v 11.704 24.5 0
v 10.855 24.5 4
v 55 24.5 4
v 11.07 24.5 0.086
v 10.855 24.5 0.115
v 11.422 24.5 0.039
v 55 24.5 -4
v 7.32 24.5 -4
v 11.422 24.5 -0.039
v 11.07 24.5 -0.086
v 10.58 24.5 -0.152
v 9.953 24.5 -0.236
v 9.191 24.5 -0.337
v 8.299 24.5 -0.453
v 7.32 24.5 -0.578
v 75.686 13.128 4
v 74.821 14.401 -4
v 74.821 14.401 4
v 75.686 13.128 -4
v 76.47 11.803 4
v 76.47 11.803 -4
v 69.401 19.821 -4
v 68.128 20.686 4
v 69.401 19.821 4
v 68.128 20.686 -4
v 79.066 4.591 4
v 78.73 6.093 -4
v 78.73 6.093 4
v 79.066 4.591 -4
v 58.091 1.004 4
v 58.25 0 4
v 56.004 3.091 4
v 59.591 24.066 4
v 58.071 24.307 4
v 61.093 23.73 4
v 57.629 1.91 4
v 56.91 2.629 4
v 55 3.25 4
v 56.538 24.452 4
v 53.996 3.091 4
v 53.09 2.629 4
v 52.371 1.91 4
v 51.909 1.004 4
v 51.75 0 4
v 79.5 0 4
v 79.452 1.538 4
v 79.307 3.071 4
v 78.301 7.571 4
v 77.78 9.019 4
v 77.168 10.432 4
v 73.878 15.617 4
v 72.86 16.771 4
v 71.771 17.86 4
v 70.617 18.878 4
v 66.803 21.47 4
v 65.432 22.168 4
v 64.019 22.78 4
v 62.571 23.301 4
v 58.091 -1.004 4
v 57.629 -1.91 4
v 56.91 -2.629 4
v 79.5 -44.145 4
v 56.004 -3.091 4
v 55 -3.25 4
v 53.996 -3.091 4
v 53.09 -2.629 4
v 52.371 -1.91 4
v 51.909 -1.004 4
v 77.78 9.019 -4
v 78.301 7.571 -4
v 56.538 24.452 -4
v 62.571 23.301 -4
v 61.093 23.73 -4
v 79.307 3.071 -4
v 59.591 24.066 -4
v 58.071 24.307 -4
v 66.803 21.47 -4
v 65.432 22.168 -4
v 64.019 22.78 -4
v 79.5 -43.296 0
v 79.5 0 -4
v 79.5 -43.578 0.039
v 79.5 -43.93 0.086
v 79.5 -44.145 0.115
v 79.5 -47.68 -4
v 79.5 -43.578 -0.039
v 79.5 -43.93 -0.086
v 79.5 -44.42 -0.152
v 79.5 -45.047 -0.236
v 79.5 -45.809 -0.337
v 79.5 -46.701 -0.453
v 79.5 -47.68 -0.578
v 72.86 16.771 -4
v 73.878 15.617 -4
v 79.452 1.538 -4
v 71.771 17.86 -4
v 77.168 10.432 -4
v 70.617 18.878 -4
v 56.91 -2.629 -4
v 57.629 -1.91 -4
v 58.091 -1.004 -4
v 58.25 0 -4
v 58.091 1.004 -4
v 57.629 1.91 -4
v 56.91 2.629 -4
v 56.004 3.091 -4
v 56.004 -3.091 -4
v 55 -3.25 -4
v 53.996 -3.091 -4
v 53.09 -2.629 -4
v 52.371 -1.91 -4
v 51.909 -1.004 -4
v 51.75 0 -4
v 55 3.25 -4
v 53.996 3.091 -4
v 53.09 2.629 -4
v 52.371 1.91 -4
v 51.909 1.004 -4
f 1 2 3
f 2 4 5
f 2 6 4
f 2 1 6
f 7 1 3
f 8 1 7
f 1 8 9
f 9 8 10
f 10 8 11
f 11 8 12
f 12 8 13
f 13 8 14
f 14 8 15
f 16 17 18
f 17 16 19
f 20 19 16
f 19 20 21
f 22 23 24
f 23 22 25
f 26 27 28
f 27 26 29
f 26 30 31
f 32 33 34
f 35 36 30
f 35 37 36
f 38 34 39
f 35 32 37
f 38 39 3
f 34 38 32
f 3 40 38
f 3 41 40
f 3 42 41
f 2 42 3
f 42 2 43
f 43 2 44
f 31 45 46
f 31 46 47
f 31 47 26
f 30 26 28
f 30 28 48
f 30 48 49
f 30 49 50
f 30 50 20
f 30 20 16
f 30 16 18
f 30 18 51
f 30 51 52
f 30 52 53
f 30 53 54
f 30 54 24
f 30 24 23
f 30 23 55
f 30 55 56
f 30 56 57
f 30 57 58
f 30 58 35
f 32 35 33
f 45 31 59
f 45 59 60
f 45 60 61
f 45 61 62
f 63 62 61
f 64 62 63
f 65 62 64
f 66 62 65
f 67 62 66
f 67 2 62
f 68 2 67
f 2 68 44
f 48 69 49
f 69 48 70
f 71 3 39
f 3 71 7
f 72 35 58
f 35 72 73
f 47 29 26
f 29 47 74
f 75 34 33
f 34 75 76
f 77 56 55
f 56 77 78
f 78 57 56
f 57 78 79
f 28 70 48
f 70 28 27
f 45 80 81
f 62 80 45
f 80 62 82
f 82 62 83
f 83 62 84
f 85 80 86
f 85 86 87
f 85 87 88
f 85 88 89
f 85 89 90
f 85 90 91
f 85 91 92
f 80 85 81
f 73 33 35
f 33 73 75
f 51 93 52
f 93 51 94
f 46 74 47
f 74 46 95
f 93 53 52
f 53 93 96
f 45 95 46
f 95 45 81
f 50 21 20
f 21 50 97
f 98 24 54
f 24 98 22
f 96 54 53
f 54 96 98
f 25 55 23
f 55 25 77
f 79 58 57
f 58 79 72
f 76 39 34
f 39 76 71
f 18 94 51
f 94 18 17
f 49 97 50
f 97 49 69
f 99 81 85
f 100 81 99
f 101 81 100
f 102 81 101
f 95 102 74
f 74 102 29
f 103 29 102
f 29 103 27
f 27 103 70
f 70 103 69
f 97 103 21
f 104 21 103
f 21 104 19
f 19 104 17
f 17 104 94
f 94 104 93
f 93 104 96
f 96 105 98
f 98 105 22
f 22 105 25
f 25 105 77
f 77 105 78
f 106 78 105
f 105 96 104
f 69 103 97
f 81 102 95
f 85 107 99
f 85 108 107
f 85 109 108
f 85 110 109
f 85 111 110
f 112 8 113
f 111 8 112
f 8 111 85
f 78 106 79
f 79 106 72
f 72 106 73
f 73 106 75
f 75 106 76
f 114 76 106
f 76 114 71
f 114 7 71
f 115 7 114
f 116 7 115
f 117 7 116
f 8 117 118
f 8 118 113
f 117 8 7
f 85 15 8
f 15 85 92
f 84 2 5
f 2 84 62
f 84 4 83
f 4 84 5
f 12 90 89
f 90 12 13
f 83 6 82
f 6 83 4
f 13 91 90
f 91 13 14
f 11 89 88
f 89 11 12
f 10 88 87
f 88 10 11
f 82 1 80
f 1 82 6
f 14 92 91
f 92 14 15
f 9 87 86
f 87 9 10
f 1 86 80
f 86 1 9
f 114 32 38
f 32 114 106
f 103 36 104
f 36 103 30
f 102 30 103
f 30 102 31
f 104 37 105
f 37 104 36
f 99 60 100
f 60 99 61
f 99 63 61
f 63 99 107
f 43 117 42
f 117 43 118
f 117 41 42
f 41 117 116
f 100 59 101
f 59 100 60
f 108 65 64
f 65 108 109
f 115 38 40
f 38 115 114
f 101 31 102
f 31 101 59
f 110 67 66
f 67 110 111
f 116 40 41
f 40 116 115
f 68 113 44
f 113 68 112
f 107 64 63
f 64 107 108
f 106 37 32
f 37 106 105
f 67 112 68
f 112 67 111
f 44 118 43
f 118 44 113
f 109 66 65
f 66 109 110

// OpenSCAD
// file: ../lib/naca4.scad
// Naca4.scad - library for parametric airfoils of 4 digit NACA series
// Code: Rudolf Huttary, Berlin 
// June 2015
// commercial use prohibited


// general use: for more examples refer to sampler.scad
// naca = naca digits or 3el vector  (default = 12 or [0, 0, .12])
// L    = chord length [mm]      (default= 100)
// N    = # sample points        (default= 81)
// h    = height [mm]            (default= 1)
// open = close at the thin end? (default = true)
// two equivalent example calls
 airfoil(naca = 2408, L = 60, N=1001, h = 30, open = false); 
// airfoil(naca = [.2, .4, .32], L = 60, N=1001, h = 30, open = false); 

module help()
{
  echo(str("\n\nList of signatures in lib:\n=================\n", 
  "module airfoil(naca=2412, L = 100, N = 81, h = 1, open = false) - renders airfoil object\n", 
  "module airfoil(naca=[.2, .4, .12], L = 100, N = 81, h = 1, open = false) - renders airfoil object using percentage for camber,  camber distance and thicknes\n", 
  "function airfoil_data(naca=12, L = 100, N = 81, open = false)\n",
  "=================\n")); 
}

help(); 
// this is the object
module airfoil(naca=12, L = 100, N = 81, h = 1, open = false)
{
  linear_extrude(height = h)
  polygon(points = airfoil_data(naca, L, N, open)); 
}

module hollow_airfoil(lnaca=12, L = 100, N = 81, h = 1, open = false, wall_thickness = 1)
{
    if (open){
        linear_extrude(height = h)
            difference(){
                polygon(points = airfoil_data(naca, L, N, false));
                offset(delta = - wall_thickness, chamfer = false) polygon(points = airfoil_data(naca, L, N, open = false));
            }
    }
    else{

        linear_extrude(height = wall_thickness)
            polygon(points = airfoil_data(naca, L, N, false)); 

        linear_extrude(height = h)
            difference(){
                polygon(points = airfoil_data(naca, L, N, open));
                offset(delta = - wall_thickness) polygon(points = airfoil_data(naca, L, N, open = false));
            }

        translate([0,0, h - wall_thickness])
            linear_extrude(height = wall_thickness)
                polygon(points = airfoil_data(naca, L, N, false)); 

    }
}


// this is the main function providing the airfoil data
function airfoil_data(naca=12, L = 100, N = 81, open = false) = 
  let(Na = len(naca)!=3?NACA(naca):naca)
  let(A = [.2969, -0.126, -.3516, .2843, open?-0.1015:-0.1036])
  [for (b=[-180:360/(N):179.99]) 
    let (x = (1-cos(b))/2)  
    let(yt = sign(b)*Na[2]/.2*(A*[sqrt(x), x, x*x, x*x*x, x*x*x*x])) 
    Na[0]==0?L*[x, yt]:L*camber(x, yt, Na[0], Na[1], sign(b))];  


function trailing_edge_angle(naca=12, open = false) = 
  let(Na = len(naca)!=3?NACA(naca):naca)
  let(A = [.2969, -0.126, -.3516, .2843, open?-0.1015:-0.1036])
  let (x =0.999)  // set x near to airfoil trailing edge
  let(yt = Na[2]/.2*(A*[sqrt(x), x, x*x, x*x*x, x*x*x*x])) // calculate distance from x-axis at previously set position
  atan2(yt,1-x);  // calculate angle of triangle between end of airfoil. The triange height corresponds to previously calculated distance from x-axis

function surface_angle(x = 0.5, naca=12, open = false) = 
  let(Na = len(naca)!=3?NACA(naca):naca)
  let(A = [0.2969, -0.126, -0.3516, 0.2843, open?-0.1015:-0.1036])
  let(dy = Na[2]/0.2*(A*[(1/2)*(1/sqrt(x)), 1, 2*x, 3*x*x, 4*x*x*x])) // calculate derivative of airfoil function at the x point
  atan(dy);  // calculate  the angle from function derivative

function surface_distance(x = 0.5, naca=12, open = false) = 
  let(Na = len(naca)!=3?NACA(naca):naca)
  let(A = [0.2969, -0.126, -0.3516, 0.2843, open?-0.1015:-0.1036])
  Na[2]/.2*(A*[sqrt(x), x, x*x, x*x*x, x*x*x*x]); // calculate distance from x-axis at previously set position

// helper functions
function NACA(naca) = 
  let (M = floor(naca/1000))
  let (P = floor((naca-M*1000)/100)) 
  [M/100, P/10, floor(naca-M*1000-P*100)/100];  

function camber(x, y, M, P, upper) = 
  let(yc = (x<P)?M/P/P*(2*P*x-x*x): M/(1-P)/(1-P)*(1 - 2*P + 2*P*x -x*x))
  let(dy = (x<P)?2*M/P/P*(P-x):2*M/(1-P)/(1-P)*(P-x))
  let(th = atan(dy))
  [upper ? x - y*sin(th):x + y*sin(th), upper ? yc + y*cos(th):yc - y*cos(th)];
// file: ../../Parameters.scad
//Main tube diameter - hole [mm]
main_tube_outer_diameter = 25.4;
main_tube_inner_diameter = 23.5;

//Tube for undercarriage - hole [mm]
tube_for_undercarriage_outer_diameter = 10.6;
tube_for_undercarriage_inner_diameter = 6;
global_clearance = 0.5;


//umístění podvozkových trubek

second_undercarriage_hole = main_tube_outer_diameter*2 + main_tube_outer_diameter/5 + main_tube_outer_diameter/2 + 170 + 160;

// Parameters of tube couplings
coupling_wall_thickness = main_tube_outer_diameter/5;  //width of coupling walls 
thickness_between_tubes = main_tube_outer_diameter/10;    // minimum distance between tubes in couplings

coupling_wall_thickness_undercarriage = tube_for_undercarriage_outer_diameter/3;
thickness_between_tubes_undercarriage = tube_for_undercarriage_outer_diameter/10;


//Screw diameter and nut for M6 [mm]
M6_screw_diameter=6.5;
Nut_height_M6 = 4.9;
Nut_diameter_M6 = 11.8;


//Screw diameter and nut for M4 [mm]
M4_screw_diameter=4.5;
Nut_height_M4 = 3.2;
Nut_diameter_M4 = 8.4;


//Screw diameter and nut for M3 [mm]
M3_screw_diameter = 3.2;
Nut_height_M3 = 2.7;	
Nut_diameter_M3 = 6.6; 


//The tube for help
Help_main_tube_outer = 25;
Help_main_tube_inner = 23; 
Help_tube_for_undercarriage_outer = 10;
Help_tube_for_undercarriage_inner = 5;


//main hull parameters

hull_drop_length = 580;
hull_wall_thickness = 0.8;
hull_y_size = 120;
hull_z_size = 150;
hull_x_size = 580;
hull_corner_radius = 4;
hull_airfoil_thickness= 35;  // thickness of drop generating airfoil in percent of lenght.
hull_scale_x = 1;
hull_scale_y = 1.5;
hull_scale_z = 1.5;

main_pilon_position = 170+68;
cover_pilon_position = 180;
height_of_vertical_tube = 275; //278mm je změřená délka trubky. 

//délka hlavní dlouhé trubky
length_of_main_tube = 920;
length_of_undercarriage_tube = 300;

ribbon_width = 5; // šířka vyztužovacích lemů. 

// šířka otvoru v přední části kapoty pro držák motoru.
width_of_engine_holder = 63;

//Top Cover Division - dělení horního krytu pro tisk
top_cover_division = [0, 50, 150, 280, 410, hull_x_size]; // upraveny seznam tak, aby deleni začinalo od nuly, což umožňí úplně automatické rozdělení.

//Bottom Cover Division - dělení dolního krytu pro tisk
bottom_cover_division = [0,100,232.5,365, 470, hull_x_size];
// zkrácená část pro payload pro testovací tisk
//bottom_cover_division = [0,200,250,365, 470, hull_x_size];

//Base Divison - dělení podložky
base_division = [0, 140, main_pilon_position - (3*main_tube_outer_diameter)/2 + 3 * main_tube_outer_diameter,second_undercarriage_hole - main_tube_outer_diameter/2 - coupling_wall_thickness + main_tube_outer_diameter+2*(main_tube_outer_diameter/5) + global_clearance, hull_x_size];

//Cover pilon division - na výšku (v ose Z)
cover_pilon_division = [0,170,height_of_vertical_tube + main_tube_outer_diameter + coupling_wall_thickness];

//pozice šroubů
	//horní kryt
top_screw_position = [0,
                    (top_cover_division[0] + top_cover_division[1])/2,
                    (top_cover_division[2] - top_cover_division[1])/2 + top_cover_division[1],
                    (top_cover_division[3] - top_cover_division[2])/2 + top_cover_division[2],
                    (top_cover_division[4] - top_cover_division[3])/8 + top_cover_division[3],
                    (top_cover_division[5] - top_cover_division[4])/2 + top_cover_division[4] - top_cover_division[1]/3];
	//spodní kryt
bottom_screw_position = [0,
                        (bottom_cover_division[0] + bottom_cover_division[1])*(2/6), 
                        bottom_cover_division[1]*(9/10), 
                        bottom_cover_division[3] + bottom_cover_division[1]*(1/10), 
                        bottom_cover_division[3] + bottom_cover_division[1]*(3/5)];




//šířka zámků
lock_width = 10;

//délka zámků
lock_length = 3;


//accumulator
//základní rozměry akumulátoru
width_of_accumulator = 129.4;//45+1;
depth_of_accumulator = 40.61;
height_of_accumulator = 43.65;
//Zapuštění akumulátoru
sink_of_accumulator = 5; //main_tube_outer_diameter/5 - Nut_height_M3*1.5;

//tloušťka hrany spojky
accumulator_holder_width = 18; 
accumulator_holder_thickness = 10; 

//posunutí akumálátoru na podložce
move_of_accumulator = 165;   // pozice akumulátoru (ovlivňuje těžiště)


////////////////
// Senzory
///////////////////

//opticalFlow
    width_optical_flow_senzor = 45.5;
    depth_optical_flow_senzor = 6;
    height_optical_flow_senzor = 35;
    sink_of_optical_flow_senzor = depth_optical_flow_senzor - 5; 
    M3_optical_flow_senzor_Z = 30.4;
    M3_optical_flow_senzor_X = 24;
    M3_optical_flow_senzor_Z_alone = 9.1;
    M3_optical_flow_senzor_X_alone = 16.7;

//GPS anténa
GPS_outer_length = 48.01;   //Vnější rozměr
GPS_inner_length = 37.48;   //Vnitřní rozměr
GPS_diameter = (GPS_outer_length - GPS_inner_length)/2;    //Průměr otvoru
GPS_middle_length = GPS_diameter + GPS_inner_length;      //Střední rozměr


////podzvozek

radius_undercarriage = 25;
vzdalenost_x = tan(20) * 131;
vzdalenost_y = (131 - radius_undercarriage)/tan(79);

maximum_printable_size = 150;


////Pitotova trubice
Pitot_tube_diameter = 4.02 + 1;
Distance_hole_from_tube = 11.92;  //vzdálenost otvoru pro připevnění od samotné trubičky


////směrové kormidlo
Rudder_length = 4*main_tube_outer_diameter;
Rudder_height = 2*main_tube_outer_diameter;
Rudder_depth = main_tube_outer_diameter/2;
gap_width = 2*hull_wall_thickness;      //šířka mezery mezi směrovkou a ocasní plochou
// main file
include <../../Parameters.scad>
use <../888_1009.scad>

888_1009_shape_A();
